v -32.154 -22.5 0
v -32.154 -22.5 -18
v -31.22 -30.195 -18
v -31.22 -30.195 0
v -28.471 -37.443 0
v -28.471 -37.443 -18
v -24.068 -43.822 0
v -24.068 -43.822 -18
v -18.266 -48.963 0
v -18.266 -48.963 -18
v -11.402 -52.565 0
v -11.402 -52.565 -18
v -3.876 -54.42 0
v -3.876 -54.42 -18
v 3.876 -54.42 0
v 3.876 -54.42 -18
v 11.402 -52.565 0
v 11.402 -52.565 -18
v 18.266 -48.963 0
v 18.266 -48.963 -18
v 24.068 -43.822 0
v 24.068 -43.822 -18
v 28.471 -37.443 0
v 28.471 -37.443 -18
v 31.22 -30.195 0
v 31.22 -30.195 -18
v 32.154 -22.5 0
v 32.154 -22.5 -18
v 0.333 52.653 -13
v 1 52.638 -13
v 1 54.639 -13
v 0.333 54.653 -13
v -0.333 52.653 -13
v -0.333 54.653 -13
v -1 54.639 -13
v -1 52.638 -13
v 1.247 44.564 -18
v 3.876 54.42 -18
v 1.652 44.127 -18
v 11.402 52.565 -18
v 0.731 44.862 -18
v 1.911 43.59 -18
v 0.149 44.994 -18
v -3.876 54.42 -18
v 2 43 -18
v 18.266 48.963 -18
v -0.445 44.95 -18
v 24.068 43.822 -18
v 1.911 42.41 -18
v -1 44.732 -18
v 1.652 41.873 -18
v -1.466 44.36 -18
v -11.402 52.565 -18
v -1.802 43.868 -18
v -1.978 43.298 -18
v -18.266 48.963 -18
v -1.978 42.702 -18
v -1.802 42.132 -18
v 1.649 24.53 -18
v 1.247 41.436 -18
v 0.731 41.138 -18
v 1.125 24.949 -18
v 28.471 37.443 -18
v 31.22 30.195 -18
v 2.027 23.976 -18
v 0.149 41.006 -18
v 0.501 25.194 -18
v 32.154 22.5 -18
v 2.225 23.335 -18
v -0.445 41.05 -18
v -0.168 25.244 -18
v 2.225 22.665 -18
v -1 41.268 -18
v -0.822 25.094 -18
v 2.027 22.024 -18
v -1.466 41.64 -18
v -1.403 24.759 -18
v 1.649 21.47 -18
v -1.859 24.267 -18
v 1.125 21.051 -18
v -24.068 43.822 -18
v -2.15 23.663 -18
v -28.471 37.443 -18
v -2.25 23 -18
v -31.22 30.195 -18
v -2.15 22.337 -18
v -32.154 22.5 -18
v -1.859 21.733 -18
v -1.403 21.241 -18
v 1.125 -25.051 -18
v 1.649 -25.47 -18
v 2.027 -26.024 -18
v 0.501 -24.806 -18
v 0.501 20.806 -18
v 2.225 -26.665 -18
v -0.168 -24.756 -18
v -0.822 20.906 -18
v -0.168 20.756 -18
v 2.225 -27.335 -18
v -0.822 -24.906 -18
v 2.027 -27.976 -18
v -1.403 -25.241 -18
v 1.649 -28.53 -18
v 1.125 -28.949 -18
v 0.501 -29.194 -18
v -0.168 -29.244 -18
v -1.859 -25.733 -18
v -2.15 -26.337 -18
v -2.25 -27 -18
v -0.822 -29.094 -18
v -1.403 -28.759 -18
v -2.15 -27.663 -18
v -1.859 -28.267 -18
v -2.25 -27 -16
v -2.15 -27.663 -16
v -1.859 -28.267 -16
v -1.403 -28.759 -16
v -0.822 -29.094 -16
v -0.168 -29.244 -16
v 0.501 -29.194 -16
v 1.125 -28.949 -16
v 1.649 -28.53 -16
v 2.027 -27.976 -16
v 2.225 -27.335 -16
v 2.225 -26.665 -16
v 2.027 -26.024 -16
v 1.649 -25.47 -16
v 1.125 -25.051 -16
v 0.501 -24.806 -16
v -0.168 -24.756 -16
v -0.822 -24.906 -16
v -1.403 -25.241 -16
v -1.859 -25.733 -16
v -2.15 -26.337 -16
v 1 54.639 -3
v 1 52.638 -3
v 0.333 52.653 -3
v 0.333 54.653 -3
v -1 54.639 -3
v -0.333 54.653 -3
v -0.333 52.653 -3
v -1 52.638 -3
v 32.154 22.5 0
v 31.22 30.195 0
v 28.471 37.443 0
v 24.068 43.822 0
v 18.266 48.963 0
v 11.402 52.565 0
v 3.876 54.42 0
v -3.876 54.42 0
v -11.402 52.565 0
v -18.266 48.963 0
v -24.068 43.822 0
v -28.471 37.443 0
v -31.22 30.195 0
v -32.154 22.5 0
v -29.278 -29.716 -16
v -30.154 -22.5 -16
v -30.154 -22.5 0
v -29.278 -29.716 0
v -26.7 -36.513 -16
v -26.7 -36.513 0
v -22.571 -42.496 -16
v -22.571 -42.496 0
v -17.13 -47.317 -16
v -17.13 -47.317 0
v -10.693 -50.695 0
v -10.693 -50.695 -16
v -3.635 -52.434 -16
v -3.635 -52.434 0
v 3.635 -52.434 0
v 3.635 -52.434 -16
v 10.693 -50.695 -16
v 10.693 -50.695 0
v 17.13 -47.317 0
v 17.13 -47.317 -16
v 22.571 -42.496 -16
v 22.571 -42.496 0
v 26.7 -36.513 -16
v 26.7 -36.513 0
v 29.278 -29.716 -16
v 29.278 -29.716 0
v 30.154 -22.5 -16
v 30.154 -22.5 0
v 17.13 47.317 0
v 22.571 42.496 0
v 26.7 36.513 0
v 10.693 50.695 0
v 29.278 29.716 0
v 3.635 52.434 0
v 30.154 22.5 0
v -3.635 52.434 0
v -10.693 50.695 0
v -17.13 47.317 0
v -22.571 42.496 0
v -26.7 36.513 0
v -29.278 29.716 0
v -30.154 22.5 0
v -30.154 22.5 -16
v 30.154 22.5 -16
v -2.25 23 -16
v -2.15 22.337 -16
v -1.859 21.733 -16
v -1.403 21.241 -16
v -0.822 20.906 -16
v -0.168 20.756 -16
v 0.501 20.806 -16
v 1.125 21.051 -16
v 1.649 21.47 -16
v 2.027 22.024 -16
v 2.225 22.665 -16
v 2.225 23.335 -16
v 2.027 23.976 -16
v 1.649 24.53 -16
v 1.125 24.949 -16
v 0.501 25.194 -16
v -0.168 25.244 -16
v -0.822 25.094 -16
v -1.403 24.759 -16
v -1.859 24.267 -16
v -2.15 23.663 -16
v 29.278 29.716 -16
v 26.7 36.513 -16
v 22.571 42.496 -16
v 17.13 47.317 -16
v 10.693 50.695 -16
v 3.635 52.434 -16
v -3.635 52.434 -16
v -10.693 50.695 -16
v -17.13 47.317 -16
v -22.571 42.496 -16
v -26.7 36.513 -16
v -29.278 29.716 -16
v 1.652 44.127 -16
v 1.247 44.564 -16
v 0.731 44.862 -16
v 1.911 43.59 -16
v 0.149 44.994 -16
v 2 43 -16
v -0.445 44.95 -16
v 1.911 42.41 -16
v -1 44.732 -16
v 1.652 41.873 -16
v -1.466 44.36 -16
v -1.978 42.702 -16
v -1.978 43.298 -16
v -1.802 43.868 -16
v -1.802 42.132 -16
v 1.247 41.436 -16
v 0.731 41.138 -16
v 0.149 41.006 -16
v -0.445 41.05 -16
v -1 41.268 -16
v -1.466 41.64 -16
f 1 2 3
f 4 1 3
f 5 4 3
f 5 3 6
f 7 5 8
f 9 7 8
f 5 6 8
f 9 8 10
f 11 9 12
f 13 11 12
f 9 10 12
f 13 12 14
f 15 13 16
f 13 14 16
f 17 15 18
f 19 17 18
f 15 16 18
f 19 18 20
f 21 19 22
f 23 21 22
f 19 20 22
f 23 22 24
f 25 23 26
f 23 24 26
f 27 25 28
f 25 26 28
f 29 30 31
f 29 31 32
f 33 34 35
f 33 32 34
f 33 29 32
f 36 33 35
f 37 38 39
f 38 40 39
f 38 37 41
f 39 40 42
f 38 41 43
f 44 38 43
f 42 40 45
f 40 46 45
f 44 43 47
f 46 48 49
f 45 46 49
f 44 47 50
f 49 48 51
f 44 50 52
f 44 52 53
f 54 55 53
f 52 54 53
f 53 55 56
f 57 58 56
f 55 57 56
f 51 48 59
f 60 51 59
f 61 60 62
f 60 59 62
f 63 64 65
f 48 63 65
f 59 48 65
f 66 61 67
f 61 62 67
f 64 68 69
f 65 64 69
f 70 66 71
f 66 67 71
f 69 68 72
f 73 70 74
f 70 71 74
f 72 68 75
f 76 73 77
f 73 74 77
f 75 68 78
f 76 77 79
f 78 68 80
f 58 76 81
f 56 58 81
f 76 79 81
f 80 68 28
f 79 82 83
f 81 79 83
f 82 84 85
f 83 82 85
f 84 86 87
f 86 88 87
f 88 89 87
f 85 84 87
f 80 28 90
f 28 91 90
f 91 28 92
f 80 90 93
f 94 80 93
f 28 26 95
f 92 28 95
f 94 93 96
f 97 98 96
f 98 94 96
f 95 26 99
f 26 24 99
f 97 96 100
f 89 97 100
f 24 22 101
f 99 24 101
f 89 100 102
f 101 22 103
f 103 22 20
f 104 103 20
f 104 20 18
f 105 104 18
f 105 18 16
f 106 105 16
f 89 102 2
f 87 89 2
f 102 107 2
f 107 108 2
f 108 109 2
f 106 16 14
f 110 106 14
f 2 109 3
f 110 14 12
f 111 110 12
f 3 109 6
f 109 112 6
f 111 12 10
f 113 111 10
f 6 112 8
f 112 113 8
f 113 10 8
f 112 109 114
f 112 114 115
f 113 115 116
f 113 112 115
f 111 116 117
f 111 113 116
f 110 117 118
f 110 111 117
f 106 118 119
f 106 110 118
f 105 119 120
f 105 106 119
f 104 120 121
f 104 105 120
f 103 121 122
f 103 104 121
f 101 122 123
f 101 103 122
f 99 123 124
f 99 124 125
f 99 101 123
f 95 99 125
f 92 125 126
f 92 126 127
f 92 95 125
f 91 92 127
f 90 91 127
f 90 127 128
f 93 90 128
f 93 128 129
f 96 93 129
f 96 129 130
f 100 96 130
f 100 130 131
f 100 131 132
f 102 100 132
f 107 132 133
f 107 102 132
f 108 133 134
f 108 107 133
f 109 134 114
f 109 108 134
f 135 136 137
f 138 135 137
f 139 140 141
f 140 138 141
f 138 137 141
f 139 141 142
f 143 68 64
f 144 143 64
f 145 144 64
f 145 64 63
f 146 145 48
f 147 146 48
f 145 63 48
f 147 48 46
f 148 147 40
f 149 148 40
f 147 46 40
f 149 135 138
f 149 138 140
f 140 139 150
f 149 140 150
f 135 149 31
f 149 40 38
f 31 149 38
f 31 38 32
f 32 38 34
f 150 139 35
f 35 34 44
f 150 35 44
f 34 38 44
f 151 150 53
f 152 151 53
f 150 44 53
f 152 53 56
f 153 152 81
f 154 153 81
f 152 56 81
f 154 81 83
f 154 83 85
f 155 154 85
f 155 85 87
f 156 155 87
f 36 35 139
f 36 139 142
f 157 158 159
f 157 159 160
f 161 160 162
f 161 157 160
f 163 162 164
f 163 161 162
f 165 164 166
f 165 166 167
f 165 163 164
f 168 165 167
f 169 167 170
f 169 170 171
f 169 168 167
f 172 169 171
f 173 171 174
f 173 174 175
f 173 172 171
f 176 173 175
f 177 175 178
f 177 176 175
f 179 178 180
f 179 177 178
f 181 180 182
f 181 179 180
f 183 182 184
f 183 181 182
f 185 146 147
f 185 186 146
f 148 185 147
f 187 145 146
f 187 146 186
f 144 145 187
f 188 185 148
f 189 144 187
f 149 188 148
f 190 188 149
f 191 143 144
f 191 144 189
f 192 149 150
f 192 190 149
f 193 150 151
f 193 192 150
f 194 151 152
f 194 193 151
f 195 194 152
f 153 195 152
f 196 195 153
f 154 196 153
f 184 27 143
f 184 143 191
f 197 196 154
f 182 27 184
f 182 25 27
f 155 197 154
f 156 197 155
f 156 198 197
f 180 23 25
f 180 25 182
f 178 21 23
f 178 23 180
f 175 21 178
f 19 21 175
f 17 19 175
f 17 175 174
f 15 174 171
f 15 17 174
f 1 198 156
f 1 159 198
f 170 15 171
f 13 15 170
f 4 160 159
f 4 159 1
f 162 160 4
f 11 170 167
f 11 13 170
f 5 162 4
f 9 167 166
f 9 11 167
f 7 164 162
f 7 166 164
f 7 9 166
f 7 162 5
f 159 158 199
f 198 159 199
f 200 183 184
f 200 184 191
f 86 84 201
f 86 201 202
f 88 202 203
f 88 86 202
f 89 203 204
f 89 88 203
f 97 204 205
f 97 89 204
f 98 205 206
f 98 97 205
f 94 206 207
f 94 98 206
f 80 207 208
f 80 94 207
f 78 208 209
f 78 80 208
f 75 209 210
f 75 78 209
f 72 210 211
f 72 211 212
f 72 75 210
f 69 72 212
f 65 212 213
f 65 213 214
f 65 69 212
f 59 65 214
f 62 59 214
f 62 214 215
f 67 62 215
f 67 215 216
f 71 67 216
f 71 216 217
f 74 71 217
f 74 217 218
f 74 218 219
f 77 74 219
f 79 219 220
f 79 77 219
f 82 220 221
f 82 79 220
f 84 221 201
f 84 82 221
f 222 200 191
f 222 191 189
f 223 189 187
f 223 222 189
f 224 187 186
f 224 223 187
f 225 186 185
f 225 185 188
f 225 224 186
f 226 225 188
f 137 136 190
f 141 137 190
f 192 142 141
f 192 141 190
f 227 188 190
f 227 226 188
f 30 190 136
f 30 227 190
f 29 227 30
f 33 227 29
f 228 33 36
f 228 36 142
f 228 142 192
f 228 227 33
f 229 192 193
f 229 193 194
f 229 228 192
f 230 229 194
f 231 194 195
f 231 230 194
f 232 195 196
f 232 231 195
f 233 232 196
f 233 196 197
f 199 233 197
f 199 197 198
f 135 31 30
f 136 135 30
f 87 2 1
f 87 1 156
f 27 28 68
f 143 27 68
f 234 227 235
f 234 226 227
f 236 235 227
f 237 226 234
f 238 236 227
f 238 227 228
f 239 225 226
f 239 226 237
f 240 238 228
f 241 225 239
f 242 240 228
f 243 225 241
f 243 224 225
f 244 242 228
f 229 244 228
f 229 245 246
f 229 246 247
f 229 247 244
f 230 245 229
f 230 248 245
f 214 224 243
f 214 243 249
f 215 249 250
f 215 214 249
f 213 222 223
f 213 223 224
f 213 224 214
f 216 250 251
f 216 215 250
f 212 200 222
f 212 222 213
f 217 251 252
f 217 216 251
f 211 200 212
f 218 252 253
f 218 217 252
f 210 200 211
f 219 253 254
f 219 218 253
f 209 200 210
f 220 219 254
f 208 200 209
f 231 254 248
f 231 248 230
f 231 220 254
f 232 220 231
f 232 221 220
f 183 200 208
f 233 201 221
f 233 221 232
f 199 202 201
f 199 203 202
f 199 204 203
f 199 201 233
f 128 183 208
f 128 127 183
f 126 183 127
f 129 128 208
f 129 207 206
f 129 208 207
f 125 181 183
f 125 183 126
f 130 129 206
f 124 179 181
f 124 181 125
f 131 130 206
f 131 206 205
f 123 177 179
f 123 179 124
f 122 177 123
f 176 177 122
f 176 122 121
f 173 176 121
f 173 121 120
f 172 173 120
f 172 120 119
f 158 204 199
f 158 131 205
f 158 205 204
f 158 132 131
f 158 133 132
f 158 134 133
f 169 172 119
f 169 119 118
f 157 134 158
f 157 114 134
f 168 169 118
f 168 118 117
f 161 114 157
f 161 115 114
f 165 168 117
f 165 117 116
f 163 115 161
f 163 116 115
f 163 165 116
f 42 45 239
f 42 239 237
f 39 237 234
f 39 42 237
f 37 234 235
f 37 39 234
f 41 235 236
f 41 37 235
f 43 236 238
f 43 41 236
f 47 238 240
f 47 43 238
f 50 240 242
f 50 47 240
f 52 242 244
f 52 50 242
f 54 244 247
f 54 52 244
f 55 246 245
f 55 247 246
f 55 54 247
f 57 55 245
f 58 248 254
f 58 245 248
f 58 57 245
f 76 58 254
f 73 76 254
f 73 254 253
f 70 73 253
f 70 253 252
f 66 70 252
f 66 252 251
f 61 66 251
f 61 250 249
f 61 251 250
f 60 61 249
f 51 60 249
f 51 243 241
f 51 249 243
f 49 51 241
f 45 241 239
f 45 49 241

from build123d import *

# Parameters (mm, degrees)
CYLINDER003_R       = 2
CYLINDER003_DEPTH   = 10
BOX_W               = 2
BOX_H               = 10
BOX_DEPTH           = 10
SKETCH003_R         = 2.25
PAD003_DEPTH        = 2
PAD002_DEPTH        = 18
CUT_PLACEMENT_ANGLE = 180


with BuildPart() as cylinder003:
    # Cylinder003 → Cylinder003 (new body)
    with BuildSketch(Plane(origin=(0, 43, -22), x_dir=(1, 0, 0), z_dir=(0, 0, 1))):
        Circle(CYLINDER003_R)
    extrude(amount=CYLINDER003_DEPTH)


with BuildPart() as cube:
    # Box → Box (new body)
    with BuildSketch(Plane(origin=(-1, -58, -13), x_dir=(1, 0, 0), z_dir=(0, 0, 1))):
        with Locations((1, 5)):
            Rectangle(BOX_W, BOX_H)
    extrude(amount=BOX_DEPTH)


with BuildPart() as body003:
    # Sketch003 → Pad003 (new body)
    with BuildSketch(Plane.XY):
        with BuildLine():
            ThreePointArc((30.15435, 22.5), (0, 52.65435), (-30.15435, 22.5))
            Line((-30.15435, 22.5), (-30.15435, -22.5))
            ThreePointArc((-30.15435, -22.5), (0, -52.65435), (30.15435, -22.5))
            Line((30.15435, 22.5), (30.15435, -22.5))
        make_face()
        with Locations((0, 27)):
            Circle(SKETCH003_R, mode=Mode.SUBTRACT)
        with Locations((0, -23)):
            Circle(SKETCH003_R, mode=Mode.SUBTRACT)
    extrude(amount=PAD003_DEPTH)


with BuildPart() as body003_1:
    # Body003 placement: moved
    add(body003.part.moved(Location((0, 0, -18))))


with BuildPart() as f_65_trafficlightcasebottom:
    # Sketch002 → Pad002 (new body)
    with BuildSketch(Plane.XY):
        with BuildLine():
            ThreePointArc((32.15435, 22.5), (0, 54.65435), (-32.15435, 22.5))
            Line((-32.15435, 22.5), (-32.15435, -22.5))
            ThreePointArc((-32.15435, -22.5), (0, -54.65435), (32.15435, -22.5))
            Line((32.15435, 22.5), (32.15435, -22.5))
        make_face()
        with BuildLine():
            ThreePointArc((30.15435, 22.5), (0, 52.65435), (-30.15435, 22.5))
            Line((-30.15435, 22.5), (-30.15435, -22.5))
            ThreePointArc((-30.15435, -22.5), (0, -52.65435), (30.15435, -22.5))
            Line((30.15435, 22.5), (30.15435, -22.5))
        make_face(mode=Mode.SUBTRACT)
    extrude(amount=PAD002_DEPTH)


with BuildPart() as f_65_trafficlightcasebottom_1:
    # Body002 placement: moved
    add(f_65_trafficlightcasebottom.part.moved(Location((0, 0, -18))))

    # Fusion001: union Body003
    add(body003_1.part)

    # Cut: cut Cube
    add(cube.part, mode=Mode.SUBTRACT)


with BuildPart() as f_65_trafficlightcasebottom_2:
    # Cut placement: moved
    add(f_65_trafficlightcasebottom_1.part.rotate(Axis((0, 0, 0), (0, 0, 1)), CUT_PLACEMENT_ANGLE))

    # Cut005: cut Cylinder003
    add(cylinder003.part, mode=Mode.SUBTRACT)


solid = f_65_trafficlightcasebottom_2.part
